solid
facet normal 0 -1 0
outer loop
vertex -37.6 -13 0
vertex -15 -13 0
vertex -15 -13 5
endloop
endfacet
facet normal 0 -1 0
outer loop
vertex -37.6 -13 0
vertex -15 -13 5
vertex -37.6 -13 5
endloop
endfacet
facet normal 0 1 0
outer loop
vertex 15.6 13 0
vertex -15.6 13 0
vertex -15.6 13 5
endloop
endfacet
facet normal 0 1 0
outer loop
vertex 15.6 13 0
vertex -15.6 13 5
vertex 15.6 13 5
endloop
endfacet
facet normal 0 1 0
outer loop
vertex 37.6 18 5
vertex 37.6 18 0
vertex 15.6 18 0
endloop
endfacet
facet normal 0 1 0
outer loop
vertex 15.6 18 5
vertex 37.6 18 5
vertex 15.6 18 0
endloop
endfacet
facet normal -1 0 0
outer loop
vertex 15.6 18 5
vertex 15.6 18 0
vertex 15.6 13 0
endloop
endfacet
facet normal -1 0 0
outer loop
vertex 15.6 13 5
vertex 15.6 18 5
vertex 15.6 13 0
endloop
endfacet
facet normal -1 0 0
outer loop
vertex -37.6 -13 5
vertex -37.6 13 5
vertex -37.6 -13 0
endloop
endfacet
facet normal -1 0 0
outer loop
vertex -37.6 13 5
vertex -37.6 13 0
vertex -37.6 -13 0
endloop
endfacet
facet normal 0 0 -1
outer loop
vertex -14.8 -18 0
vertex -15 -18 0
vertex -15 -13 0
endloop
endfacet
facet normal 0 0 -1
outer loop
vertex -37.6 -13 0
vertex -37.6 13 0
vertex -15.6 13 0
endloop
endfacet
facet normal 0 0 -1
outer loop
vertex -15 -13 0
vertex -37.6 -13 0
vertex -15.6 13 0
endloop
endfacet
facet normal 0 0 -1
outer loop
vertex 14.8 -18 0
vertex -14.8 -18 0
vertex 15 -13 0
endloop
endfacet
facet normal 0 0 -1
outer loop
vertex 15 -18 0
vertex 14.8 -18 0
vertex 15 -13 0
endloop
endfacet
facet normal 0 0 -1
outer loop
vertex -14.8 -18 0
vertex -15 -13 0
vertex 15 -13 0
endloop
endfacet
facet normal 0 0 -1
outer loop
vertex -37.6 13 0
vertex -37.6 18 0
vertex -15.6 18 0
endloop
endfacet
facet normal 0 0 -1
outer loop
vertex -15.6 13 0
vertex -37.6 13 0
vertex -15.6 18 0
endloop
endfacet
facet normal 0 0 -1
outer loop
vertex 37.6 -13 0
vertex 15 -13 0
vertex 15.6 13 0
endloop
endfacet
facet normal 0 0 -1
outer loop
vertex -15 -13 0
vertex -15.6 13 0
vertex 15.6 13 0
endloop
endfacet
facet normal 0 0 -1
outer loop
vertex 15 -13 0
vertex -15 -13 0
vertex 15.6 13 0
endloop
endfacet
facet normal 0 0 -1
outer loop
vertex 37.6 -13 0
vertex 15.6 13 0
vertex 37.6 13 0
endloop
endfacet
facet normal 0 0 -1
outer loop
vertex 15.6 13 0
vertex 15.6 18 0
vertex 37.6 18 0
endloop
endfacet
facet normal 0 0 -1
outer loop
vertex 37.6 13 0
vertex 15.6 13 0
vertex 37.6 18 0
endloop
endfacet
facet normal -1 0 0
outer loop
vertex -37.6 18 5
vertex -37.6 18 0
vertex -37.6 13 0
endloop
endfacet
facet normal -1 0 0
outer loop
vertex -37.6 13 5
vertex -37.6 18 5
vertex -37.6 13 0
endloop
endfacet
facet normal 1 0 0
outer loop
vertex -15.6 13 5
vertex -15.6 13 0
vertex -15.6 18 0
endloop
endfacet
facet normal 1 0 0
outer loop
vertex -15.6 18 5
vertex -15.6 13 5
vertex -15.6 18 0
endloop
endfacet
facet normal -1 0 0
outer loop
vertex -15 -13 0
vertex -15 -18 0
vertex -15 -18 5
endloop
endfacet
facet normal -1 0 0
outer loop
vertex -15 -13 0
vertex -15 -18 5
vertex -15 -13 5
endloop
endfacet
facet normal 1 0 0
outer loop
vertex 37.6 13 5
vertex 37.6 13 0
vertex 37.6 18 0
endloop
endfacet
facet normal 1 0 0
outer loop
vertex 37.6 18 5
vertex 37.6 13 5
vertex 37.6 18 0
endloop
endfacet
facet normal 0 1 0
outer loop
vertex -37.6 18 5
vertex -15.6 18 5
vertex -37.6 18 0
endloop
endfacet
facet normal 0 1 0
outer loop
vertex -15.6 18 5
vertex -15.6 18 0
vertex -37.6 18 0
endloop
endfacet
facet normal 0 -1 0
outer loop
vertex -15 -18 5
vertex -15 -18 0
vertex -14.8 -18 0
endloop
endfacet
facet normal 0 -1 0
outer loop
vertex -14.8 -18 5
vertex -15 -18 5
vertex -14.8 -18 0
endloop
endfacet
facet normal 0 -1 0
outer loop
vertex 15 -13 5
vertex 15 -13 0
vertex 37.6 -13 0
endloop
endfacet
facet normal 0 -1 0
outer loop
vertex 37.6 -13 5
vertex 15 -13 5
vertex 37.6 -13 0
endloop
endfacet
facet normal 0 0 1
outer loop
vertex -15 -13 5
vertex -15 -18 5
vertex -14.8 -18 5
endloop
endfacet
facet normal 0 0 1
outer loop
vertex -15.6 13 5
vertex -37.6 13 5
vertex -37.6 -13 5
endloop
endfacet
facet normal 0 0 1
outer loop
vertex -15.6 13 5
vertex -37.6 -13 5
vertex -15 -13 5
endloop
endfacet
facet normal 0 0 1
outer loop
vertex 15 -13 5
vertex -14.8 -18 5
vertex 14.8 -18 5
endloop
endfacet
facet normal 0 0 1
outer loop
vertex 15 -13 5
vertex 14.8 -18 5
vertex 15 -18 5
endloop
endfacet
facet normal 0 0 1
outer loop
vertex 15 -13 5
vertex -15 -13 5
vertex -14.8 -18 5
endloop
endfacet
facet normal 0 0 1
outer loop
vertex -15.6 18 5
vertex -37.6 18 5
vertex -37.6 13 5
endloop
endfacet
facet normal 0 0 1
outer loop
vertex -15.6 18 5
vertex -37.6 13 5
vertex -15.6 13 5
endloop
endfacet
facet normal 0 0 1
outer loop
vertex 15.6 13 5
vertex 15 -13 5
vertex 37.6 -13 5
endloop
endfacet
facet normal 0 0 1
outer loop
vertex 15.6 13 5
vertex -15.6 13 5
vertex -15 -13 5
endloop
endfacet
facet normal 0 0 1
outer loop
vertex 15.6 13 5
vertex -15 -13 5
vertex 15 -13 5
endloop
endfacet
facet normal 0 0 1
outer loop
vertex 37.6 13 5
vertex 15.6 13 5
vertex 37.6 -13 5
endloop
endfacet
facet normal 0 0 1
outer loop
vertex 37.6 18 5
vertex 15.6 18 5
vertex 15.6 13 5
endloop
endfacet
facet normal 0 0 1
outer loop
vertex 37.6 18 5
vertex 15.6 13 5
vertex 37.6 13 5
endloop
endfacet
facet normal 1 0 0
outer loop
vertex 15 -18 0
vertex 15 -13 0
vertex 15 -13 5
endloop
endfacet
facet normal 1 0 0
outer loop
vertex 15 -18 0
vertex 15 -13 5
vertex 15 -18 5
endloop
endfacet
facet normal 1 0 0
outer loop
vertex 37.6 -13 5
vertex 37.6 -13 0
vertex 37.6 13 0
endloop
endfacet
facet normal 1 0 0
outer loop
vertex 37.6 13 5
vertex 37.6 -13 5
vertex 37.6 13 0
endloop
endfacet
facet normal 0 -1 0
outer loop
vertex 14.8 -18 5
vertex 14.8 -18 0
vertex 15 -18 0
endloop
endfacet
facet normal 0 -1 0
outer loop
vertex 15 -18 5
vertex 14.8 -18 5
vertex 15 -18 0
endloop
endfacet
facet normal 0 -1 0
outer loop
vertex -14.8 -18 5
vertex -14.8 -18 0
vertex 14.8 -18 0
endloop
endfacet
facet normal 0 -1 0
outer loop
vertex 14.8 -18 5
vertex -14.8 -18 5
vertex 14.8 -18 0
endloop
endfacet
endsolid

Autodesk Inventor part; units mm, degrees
ref_plane "YZ Plane" through (0, 0, 0) normal (1, 0, 0) x (0, 1, 0)
ref_plane "XZ Plane" through (0, 0, 0) normal (0, 1, 0) x (-1, 0, 0)
ref_plane "XY Plane" through (0, 0, 0) normal (0, 0, 1) x (1, 0, 0)
sketch "Sketch1" plane through (0, 0, 0) normal (0, 0, 1) x (1, 0, 0)
  line L0 (-37.6, -18) -> (37.6, -18)
  line L1 (37.6, -18) -> (37.6, 18)
  line L2 (37.6, 18) -> (-37.6, 18)
  line L3 (-37.6, 18) -> (-37.6, -18)
  line L4 (-37.6, -18) -> (37.6, 18) construction
  line L5 (37.6, -18) -> (-37.6, 18) construction
  line L6 (-15.1, 18) -> (5.2739, 18)
  line L7 (-14.8, -18) -> (-37.6, -18)
  line L8 (-37.6, -18) -> (-37.6, -13)
  line L9 (0, 0) -> (0, -18) construction
  line L10 (14.8, -18) -> (37.6, -18)
  line L11 (37.6, -18) -> (37.6, -13)
  line L12 (-15.1, 18) -> (-37.6, 18)
  line L13 (-37.6, 18) -> (-37.6, 13)
  line L14 (15.1, 18) -> (37.6, 18)
  line L15 (37.6, 18) -> (37.6, 13)
  line L16 (-15, -13) -> (15, -13) construction
  line L17 (15, -13) -> (15, -18)
  line L18 (15, -18) -> (-15, -18)
  line L19 (-15, -18) -> (-15, -13)
  line L20 (-15, -13) -> (15, -18) construction
  line L21 (15, -13) -> (-15, -18) construction
  line L22 (-15, -13) -> (-37.6, -13)
  line L23 (15, -13) -> (37.6, -13)
  line L24 (-37.6, 13) -> (-15.6, 13) construction
  line L25 (-15.6, 13) -> (-15.6, 18)
  line L26 (-15.6, 18) -> (-37.6, 18)
  line L27 (-37.6, 18) -> (-37.6, 13)
  line L28 (-37.6, 13) -> (-15.6, 18) construction
  line L29 (-15.6, 13) -> (-37.6, 18) construction
  line L30 (15.6, 13) -> (37.6, 13) construction
  line L31 (37.6, 13) -> (37.6, 18)
  line L32 (37.6, 18) -> (15.6, 18)
  line L33 (15.6, 18) -> (15.6, 13)
  line L34 (15.6, 13) -> (37.6, 18) construction
  line L35 (37.6, 13) -> (15.6, 18) construction
  line L36 (-15.6, 13) -> (15.6, 13)
  point P0 (0, -15.5)
  point P1 (-37.6, -13)
  point P2 (-15, -18)
  point P3 (-26.6, 15.5)
  point P4 (26.6, 15.5)
  point P5 (15.6, 18)
  dimension "d1" = 36
  dimension "d27" = 5
  dimension "d28" = 30
  dimension "d30" = 5
  dimension "d31" = 5
  dimension "d32" = 22
  dimension "d33" = 22
  dimension "d34" = 53.2
extrude "Extrusion1" add sketch "Sketch1" along normal blind 5 contours L19 L22 L3 L2 L25 L36 L33 L1 L23 L17 L0
equation "\"d31\" = d30"
equation "\"d33\" = d32"
properties part number "lower-back-plate-support"
